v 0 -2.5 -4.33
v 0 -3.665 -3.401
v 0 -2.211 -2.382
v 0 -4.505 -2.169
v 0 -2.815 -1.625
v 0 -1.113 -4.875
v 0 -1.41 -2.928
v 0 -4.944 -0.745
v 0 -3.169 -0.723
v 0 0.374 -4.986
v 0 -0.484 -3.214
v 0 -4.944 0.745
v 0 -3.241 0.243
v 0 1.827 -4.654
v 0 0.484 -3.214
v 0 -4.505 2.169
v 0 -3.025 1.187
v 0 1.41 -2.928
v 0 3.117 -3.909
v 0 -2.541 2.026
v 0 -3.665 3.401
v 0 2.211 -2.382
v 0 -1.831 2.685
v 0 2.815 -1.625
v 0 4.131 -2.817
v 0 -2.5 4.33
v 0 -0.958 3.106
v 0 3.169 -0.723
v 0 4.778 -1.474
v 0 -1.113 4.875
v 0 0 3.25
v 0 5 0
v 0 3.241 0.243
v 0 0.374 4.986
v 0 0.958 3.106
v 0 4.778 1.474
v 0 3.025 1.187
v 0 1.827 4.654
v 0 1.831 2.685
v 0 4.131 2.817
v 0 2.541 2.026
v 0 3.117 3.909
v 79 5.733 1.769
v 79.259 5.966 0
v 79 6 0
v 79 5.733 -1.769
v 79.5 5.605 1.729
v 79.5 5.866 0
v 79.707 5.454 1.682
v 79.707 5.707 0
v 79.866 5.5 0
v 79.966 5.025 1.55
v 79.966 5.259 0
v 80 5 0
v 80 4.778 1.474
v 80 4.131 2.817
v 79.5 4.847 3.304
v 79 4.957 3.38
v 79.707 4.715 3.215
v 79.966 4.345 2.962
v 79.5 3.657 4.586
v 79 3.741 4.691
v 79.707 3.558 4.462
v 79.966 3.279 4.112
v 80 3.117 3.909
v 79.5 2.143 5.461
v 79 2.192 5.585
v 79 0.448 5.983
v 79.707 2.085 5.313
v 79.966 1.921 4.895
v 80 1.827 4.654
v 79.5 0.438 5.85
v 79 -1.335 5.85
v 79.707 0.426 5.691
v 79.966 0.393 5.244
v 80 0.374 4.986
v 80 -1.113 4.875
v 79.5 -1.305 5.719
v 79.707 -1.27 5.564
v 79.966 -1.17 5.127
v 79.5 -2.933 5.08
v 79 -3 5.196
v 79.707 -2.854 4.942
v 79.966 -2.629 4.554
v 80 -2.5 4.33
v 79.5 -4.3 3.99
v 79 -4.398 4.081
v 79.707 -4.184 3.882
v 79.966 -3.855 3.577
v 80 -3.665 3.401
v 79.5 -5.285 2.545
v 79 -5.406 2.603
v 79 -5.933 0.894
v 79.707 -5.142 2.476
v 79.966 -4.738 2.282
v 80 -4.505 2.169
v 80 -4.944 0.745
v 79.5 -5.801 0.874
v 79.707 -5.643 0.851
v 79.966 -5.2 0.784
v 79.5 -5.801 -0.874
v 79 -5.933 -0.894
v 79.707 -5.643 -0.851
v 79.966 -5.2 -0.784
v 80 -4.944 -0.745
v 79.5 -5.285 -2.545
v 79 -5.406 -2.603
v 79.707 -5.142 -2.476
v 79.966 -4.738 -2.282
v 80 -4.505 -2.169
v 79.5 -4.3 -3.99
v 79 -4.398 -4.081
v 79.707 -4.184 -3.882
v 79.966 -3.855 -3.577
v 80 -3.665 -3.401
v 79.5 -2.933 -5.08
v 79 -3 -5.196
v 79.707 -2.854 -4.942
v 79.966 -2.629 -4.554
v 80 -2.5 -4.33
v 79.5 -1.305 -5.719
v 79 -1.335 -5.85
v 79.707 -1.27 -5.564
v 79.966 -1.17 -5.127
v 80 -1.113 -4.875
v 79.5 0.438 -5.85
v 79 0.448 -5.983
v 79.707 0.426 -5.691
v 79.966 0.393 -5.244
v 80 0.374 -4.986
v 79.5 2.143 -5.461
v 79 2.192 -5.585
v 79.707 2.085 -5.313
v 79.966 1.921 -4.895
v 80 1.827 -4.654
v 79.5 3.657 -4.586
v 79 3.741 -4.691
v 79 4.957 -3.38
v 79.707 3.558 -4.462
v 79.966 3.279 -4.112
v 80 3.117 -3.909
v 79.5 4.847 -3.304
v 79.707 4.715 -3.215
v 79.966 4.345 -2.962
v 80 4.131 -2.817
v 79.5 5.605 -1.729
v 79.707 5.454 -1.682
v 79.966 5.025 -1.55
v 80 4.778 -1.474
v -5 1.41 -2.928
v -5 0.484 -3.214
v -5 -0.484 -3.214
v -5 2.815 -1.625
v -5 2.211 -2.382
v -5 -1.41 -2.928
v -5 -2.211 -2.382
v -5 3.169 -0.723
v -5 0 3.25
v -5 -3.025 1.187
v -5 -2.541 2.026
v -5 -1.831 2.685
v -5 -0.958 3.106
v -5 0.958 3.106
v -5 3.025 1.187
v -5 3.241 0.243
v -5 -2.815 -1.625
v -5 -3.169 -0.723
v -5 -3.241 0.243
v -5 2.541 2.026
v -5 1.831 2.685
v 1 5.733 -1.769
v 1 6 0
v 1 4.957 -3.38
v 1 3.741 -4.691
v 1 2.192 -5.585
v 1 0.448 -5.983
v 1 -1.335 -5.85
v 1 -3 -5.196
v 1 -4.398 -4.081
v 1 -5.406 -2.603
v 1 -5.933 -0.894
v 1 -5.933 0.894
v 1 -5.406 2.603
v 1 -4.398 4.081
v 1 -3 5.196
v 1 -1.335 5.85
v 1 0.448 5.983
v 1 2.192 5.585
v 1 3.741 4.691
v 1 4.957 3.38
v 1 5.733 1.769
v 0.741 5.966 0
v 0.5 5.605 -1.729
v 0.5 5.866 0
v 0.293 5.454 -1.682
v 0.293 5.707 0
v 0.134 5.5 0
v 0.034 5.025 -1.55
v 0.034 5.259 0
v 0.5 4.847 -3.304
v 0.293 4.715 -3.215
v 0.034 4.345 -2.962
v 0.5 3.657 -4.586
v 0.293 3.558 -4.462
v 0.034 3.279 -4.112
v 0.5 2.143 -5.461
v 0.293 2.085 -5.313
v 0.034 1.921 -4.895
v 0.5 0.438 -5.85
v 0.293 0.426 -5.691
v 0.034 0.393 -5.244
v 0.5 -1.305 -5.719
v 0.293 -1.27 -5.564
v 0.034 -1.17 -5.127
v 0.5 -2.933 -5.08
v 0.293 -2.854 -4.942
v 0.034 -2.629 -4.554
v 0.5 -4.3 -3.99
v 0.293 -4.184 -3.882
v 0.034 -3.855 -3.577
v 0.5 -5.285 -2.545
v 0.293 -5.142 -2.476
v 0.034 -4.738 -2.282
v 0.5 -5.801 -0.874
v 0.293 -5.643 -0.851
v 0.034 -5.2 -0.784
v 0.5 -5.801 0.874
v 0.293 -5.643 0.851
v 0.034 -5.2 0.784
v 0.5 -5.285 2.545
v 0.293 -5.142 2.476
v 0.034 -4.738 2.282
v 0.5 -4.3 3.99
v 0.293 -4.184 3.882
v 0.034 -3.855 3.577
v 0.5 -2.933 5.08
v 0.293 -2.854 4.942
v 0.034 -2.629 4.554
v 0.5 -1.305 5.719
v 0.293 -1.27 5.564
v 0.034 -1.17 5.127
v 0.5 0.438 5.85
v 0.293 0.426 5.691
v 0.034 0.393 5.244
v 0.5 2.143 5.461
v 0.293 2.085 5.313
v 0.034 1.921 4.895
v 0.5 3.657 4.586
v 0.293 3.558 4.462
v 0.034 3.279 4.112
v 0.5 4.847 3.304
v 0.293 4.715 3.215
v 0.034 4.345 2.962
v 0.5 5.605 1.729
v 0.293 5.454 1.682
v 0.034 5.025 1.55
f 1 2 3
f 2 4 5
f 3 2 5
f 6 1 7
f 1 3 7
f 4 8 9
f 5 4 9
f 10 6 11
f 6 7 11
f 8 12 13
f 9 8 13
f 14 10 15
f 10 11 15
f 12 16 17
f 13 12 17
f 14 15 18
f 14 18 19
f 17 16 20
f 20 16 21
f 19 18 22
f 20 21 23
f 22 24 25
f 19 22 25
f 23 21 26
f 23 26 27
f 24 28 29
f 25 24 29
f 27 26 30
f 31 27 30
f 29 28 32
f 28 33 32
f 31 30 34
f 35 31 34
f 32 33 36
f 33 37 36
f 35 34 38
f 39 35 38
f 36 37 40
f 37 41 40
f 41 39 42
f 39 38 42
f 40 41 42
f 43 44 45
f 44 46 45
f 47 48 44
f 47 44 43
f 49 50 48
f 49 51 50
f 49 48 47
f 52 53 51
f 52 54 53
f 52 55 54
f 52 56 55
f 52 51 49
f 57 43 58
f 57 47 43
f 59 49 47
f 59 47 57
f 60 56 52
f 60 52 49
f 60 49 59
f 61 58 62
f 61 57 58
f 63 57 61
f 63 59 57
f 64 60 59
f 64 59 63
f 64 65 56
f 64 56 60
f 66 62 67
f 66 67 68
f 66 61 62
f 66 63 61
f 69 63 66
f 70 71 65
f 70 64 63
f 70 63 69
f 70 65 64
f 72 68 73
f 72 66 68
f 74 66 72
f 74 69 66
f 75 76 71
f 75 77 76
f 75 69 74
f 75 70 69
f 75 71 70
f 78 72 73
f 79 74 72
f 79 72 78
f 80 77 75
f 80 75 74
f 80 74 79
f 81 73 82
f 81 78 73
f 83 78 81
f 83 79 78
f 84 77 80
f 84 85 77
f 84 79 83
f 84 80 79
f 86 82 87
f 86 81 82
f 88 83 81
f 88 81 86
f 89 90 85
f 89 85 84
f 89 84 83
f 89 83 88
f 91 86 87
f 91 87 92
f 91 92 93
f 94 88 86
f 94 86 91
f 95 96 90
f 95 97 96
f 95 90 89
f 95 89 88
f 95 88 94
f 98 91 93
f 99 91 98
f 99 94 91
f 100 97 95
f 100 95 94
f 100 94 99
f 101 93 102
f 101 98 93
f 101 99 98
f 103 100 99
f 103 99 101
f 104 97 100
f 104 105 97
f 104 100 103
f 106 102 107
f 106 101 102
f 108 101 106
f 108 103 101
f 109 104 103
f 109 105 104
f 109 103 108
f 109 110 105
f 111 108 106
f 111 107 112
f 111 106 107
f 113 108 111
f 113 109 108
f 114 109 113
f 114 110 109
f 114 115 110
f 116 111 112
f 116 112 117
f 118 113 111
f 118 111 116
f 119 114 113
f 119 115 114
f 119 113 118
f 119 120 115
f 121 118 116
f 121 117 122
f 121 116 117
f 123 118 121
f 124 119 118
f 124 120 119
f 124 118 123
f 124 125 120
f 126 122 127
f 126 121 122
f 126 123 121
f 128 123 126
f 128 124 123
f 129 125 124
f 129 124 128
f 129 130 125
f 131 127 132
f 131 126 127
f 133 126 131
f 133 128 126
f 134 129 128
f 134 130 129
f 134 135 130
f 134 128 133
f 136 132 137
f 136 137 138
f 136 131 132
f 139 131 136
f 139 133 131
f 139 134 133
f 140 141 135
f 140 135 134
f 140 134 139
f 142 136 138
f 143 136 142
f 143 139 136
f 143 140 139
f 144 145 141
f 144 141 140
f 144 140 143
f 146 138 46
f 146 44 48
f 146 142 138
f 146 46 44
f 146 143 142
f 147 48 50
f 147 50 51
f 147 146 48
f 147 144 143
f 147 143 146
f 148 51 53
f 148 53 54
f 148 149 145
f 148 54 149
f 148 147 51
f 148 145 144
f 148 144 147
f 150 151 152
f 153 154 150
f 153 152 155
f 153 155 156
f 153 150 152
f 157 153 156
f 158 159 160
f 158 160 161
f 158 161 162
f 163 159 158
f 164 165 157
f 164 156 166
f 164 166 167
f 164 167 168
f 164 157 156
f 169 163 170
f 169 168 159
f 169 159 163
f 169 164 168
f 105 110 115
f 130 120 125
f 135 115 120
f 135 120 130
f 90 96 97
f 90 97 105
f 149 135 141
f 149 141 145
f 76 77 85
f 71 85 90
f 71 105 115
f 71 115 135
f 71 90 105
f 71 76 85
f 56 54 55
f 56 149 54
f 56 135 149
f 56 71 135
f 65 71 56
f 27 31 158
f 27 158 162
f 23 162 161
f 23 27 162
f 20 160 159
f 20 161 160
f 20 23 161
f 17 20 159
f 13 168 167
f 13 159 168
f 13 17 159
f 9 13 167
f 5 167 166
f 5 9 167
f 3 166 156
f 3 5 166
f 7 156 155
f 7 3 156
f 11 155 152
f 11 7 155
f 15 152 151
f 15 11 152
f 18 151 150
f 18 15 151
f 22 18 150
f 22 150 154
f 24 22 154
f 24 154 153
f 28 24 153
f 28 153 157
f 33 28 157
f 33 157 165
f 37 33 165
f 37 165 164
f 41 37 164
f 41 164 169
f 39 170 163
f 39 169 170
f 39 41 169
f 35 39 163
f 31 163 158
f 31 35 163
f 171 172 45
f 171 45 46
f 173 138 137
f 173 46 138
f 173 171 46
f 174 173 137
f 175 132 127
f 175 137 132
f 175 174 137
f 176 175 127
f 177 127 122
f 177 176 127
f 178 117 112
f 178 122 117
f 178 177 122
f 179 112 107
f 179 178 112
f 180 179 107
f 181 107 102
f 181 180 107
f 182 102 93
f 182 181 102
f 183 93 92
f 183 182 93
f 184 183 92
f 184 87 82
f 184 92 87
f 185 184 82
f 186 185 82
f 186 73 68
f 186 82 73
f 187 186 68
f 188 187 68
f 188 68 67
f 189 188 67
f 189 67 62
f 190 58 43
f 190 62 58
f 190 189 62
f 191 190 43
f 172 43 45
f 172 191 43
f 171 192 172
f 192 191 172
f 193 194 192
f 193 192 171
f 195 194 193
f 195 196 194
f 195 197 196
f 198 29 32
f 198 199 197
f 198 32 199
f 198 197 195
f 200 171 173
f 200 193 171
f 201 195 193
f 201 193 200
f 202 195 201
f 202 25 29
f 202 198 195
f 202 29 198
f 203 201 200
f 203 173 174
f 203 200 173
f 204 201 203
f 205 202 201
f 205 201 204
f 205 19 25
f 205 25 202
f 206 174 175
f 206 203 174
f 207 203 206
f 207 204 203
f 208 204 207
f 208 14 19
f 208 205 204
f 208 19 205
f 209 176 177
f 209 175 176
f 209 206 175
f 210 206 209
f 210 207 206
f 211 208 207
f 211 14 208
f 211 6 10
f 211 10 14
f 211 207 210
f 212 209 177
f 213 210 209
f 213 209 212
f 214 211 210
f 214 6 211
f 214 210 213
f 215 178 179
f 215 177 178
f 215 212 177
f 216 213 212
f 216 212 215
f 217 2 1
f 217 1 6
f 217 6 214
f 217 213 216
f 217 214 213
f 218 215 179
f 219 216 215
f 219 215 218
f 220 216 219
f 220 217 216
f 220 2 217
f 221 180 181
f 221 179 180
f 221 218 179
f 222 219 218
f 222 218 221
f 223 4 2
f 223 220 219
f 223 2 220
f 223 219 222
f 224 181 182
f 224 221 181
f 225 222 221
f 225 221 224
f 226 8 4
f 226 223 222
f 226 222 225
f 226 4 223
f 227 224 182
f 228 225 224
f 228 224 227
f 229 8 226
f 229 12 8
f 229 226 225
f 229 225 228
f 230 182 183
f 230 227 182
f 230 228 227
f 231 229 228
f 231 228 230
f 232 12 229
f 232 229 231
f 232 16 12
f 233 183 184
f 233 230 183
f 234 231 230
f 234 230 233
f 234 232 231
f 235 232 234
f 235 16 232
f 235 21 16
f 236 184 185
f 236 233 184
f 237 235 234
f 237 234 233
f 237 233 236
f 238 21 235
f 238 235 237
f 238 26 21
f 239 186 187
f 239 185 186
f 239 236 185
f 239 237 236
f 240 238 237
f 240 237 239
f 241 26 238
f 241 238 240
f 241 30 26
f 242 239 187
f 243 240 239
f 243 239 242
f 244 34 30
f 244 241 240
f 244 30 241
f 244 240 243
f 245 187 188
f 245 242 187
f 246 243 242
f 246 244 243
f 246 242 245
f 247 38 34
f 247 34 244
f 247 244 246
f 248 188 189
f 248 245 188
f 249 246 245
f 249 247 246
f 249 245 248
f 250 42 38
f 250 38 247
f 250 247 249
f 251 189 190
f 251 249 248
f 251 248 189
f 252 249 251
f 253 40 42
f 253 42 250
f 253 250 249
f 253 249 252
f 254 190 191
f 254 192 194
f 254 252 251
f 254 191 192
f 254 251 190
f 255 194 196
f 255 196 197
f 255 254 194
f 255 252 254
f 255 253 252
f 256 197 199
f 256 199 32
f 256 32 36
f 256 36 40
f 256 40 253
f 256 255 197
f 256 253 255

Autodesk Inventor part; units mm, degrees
ref_plane "YZ Plane" through (0, 0, 0) normal (1, 0, 0) x (0, 1, 0)
ref_plane "XZ Plane" through (0, 0, 0) normal (0, 1, 0) x (-1, 0, 0)
ref_plane "XY Plane" through (0, 0, 0) normal (0, 0, 1) x (1, 0, 0)
sketch "Sketch1" plane through (0, 0, 0) normal (1, 0, 0) x (0, 1, 0)
  point P0 (0, 0)
sketch "Sketch2" plane through (0, 0, 0) normal (1, 0, 0) x (0, 1, 0)
  circle A0 centre (0, 0) radius 6
  dimension "d0" = 12
extrude "Extrusion1" add sketch "Sketch2" along normal blind 80
sketch "Sketch3" plane through (0, 0, 0) normal (-1, 0, 0) x (0, 0, 1)
  circle A0 centre (0, 0) radius 3.25
  dimension "d3" = 6.5
extrude "Extrusion2" add sketch "Sketch3" along normal blind 5
fillet "Fillet1" radius 1 1 edges at (0, -6, 0)
fillet "Fillet2" radius 1 1 edges at (80, -6, 0)
properties part number "Handle_holder"
